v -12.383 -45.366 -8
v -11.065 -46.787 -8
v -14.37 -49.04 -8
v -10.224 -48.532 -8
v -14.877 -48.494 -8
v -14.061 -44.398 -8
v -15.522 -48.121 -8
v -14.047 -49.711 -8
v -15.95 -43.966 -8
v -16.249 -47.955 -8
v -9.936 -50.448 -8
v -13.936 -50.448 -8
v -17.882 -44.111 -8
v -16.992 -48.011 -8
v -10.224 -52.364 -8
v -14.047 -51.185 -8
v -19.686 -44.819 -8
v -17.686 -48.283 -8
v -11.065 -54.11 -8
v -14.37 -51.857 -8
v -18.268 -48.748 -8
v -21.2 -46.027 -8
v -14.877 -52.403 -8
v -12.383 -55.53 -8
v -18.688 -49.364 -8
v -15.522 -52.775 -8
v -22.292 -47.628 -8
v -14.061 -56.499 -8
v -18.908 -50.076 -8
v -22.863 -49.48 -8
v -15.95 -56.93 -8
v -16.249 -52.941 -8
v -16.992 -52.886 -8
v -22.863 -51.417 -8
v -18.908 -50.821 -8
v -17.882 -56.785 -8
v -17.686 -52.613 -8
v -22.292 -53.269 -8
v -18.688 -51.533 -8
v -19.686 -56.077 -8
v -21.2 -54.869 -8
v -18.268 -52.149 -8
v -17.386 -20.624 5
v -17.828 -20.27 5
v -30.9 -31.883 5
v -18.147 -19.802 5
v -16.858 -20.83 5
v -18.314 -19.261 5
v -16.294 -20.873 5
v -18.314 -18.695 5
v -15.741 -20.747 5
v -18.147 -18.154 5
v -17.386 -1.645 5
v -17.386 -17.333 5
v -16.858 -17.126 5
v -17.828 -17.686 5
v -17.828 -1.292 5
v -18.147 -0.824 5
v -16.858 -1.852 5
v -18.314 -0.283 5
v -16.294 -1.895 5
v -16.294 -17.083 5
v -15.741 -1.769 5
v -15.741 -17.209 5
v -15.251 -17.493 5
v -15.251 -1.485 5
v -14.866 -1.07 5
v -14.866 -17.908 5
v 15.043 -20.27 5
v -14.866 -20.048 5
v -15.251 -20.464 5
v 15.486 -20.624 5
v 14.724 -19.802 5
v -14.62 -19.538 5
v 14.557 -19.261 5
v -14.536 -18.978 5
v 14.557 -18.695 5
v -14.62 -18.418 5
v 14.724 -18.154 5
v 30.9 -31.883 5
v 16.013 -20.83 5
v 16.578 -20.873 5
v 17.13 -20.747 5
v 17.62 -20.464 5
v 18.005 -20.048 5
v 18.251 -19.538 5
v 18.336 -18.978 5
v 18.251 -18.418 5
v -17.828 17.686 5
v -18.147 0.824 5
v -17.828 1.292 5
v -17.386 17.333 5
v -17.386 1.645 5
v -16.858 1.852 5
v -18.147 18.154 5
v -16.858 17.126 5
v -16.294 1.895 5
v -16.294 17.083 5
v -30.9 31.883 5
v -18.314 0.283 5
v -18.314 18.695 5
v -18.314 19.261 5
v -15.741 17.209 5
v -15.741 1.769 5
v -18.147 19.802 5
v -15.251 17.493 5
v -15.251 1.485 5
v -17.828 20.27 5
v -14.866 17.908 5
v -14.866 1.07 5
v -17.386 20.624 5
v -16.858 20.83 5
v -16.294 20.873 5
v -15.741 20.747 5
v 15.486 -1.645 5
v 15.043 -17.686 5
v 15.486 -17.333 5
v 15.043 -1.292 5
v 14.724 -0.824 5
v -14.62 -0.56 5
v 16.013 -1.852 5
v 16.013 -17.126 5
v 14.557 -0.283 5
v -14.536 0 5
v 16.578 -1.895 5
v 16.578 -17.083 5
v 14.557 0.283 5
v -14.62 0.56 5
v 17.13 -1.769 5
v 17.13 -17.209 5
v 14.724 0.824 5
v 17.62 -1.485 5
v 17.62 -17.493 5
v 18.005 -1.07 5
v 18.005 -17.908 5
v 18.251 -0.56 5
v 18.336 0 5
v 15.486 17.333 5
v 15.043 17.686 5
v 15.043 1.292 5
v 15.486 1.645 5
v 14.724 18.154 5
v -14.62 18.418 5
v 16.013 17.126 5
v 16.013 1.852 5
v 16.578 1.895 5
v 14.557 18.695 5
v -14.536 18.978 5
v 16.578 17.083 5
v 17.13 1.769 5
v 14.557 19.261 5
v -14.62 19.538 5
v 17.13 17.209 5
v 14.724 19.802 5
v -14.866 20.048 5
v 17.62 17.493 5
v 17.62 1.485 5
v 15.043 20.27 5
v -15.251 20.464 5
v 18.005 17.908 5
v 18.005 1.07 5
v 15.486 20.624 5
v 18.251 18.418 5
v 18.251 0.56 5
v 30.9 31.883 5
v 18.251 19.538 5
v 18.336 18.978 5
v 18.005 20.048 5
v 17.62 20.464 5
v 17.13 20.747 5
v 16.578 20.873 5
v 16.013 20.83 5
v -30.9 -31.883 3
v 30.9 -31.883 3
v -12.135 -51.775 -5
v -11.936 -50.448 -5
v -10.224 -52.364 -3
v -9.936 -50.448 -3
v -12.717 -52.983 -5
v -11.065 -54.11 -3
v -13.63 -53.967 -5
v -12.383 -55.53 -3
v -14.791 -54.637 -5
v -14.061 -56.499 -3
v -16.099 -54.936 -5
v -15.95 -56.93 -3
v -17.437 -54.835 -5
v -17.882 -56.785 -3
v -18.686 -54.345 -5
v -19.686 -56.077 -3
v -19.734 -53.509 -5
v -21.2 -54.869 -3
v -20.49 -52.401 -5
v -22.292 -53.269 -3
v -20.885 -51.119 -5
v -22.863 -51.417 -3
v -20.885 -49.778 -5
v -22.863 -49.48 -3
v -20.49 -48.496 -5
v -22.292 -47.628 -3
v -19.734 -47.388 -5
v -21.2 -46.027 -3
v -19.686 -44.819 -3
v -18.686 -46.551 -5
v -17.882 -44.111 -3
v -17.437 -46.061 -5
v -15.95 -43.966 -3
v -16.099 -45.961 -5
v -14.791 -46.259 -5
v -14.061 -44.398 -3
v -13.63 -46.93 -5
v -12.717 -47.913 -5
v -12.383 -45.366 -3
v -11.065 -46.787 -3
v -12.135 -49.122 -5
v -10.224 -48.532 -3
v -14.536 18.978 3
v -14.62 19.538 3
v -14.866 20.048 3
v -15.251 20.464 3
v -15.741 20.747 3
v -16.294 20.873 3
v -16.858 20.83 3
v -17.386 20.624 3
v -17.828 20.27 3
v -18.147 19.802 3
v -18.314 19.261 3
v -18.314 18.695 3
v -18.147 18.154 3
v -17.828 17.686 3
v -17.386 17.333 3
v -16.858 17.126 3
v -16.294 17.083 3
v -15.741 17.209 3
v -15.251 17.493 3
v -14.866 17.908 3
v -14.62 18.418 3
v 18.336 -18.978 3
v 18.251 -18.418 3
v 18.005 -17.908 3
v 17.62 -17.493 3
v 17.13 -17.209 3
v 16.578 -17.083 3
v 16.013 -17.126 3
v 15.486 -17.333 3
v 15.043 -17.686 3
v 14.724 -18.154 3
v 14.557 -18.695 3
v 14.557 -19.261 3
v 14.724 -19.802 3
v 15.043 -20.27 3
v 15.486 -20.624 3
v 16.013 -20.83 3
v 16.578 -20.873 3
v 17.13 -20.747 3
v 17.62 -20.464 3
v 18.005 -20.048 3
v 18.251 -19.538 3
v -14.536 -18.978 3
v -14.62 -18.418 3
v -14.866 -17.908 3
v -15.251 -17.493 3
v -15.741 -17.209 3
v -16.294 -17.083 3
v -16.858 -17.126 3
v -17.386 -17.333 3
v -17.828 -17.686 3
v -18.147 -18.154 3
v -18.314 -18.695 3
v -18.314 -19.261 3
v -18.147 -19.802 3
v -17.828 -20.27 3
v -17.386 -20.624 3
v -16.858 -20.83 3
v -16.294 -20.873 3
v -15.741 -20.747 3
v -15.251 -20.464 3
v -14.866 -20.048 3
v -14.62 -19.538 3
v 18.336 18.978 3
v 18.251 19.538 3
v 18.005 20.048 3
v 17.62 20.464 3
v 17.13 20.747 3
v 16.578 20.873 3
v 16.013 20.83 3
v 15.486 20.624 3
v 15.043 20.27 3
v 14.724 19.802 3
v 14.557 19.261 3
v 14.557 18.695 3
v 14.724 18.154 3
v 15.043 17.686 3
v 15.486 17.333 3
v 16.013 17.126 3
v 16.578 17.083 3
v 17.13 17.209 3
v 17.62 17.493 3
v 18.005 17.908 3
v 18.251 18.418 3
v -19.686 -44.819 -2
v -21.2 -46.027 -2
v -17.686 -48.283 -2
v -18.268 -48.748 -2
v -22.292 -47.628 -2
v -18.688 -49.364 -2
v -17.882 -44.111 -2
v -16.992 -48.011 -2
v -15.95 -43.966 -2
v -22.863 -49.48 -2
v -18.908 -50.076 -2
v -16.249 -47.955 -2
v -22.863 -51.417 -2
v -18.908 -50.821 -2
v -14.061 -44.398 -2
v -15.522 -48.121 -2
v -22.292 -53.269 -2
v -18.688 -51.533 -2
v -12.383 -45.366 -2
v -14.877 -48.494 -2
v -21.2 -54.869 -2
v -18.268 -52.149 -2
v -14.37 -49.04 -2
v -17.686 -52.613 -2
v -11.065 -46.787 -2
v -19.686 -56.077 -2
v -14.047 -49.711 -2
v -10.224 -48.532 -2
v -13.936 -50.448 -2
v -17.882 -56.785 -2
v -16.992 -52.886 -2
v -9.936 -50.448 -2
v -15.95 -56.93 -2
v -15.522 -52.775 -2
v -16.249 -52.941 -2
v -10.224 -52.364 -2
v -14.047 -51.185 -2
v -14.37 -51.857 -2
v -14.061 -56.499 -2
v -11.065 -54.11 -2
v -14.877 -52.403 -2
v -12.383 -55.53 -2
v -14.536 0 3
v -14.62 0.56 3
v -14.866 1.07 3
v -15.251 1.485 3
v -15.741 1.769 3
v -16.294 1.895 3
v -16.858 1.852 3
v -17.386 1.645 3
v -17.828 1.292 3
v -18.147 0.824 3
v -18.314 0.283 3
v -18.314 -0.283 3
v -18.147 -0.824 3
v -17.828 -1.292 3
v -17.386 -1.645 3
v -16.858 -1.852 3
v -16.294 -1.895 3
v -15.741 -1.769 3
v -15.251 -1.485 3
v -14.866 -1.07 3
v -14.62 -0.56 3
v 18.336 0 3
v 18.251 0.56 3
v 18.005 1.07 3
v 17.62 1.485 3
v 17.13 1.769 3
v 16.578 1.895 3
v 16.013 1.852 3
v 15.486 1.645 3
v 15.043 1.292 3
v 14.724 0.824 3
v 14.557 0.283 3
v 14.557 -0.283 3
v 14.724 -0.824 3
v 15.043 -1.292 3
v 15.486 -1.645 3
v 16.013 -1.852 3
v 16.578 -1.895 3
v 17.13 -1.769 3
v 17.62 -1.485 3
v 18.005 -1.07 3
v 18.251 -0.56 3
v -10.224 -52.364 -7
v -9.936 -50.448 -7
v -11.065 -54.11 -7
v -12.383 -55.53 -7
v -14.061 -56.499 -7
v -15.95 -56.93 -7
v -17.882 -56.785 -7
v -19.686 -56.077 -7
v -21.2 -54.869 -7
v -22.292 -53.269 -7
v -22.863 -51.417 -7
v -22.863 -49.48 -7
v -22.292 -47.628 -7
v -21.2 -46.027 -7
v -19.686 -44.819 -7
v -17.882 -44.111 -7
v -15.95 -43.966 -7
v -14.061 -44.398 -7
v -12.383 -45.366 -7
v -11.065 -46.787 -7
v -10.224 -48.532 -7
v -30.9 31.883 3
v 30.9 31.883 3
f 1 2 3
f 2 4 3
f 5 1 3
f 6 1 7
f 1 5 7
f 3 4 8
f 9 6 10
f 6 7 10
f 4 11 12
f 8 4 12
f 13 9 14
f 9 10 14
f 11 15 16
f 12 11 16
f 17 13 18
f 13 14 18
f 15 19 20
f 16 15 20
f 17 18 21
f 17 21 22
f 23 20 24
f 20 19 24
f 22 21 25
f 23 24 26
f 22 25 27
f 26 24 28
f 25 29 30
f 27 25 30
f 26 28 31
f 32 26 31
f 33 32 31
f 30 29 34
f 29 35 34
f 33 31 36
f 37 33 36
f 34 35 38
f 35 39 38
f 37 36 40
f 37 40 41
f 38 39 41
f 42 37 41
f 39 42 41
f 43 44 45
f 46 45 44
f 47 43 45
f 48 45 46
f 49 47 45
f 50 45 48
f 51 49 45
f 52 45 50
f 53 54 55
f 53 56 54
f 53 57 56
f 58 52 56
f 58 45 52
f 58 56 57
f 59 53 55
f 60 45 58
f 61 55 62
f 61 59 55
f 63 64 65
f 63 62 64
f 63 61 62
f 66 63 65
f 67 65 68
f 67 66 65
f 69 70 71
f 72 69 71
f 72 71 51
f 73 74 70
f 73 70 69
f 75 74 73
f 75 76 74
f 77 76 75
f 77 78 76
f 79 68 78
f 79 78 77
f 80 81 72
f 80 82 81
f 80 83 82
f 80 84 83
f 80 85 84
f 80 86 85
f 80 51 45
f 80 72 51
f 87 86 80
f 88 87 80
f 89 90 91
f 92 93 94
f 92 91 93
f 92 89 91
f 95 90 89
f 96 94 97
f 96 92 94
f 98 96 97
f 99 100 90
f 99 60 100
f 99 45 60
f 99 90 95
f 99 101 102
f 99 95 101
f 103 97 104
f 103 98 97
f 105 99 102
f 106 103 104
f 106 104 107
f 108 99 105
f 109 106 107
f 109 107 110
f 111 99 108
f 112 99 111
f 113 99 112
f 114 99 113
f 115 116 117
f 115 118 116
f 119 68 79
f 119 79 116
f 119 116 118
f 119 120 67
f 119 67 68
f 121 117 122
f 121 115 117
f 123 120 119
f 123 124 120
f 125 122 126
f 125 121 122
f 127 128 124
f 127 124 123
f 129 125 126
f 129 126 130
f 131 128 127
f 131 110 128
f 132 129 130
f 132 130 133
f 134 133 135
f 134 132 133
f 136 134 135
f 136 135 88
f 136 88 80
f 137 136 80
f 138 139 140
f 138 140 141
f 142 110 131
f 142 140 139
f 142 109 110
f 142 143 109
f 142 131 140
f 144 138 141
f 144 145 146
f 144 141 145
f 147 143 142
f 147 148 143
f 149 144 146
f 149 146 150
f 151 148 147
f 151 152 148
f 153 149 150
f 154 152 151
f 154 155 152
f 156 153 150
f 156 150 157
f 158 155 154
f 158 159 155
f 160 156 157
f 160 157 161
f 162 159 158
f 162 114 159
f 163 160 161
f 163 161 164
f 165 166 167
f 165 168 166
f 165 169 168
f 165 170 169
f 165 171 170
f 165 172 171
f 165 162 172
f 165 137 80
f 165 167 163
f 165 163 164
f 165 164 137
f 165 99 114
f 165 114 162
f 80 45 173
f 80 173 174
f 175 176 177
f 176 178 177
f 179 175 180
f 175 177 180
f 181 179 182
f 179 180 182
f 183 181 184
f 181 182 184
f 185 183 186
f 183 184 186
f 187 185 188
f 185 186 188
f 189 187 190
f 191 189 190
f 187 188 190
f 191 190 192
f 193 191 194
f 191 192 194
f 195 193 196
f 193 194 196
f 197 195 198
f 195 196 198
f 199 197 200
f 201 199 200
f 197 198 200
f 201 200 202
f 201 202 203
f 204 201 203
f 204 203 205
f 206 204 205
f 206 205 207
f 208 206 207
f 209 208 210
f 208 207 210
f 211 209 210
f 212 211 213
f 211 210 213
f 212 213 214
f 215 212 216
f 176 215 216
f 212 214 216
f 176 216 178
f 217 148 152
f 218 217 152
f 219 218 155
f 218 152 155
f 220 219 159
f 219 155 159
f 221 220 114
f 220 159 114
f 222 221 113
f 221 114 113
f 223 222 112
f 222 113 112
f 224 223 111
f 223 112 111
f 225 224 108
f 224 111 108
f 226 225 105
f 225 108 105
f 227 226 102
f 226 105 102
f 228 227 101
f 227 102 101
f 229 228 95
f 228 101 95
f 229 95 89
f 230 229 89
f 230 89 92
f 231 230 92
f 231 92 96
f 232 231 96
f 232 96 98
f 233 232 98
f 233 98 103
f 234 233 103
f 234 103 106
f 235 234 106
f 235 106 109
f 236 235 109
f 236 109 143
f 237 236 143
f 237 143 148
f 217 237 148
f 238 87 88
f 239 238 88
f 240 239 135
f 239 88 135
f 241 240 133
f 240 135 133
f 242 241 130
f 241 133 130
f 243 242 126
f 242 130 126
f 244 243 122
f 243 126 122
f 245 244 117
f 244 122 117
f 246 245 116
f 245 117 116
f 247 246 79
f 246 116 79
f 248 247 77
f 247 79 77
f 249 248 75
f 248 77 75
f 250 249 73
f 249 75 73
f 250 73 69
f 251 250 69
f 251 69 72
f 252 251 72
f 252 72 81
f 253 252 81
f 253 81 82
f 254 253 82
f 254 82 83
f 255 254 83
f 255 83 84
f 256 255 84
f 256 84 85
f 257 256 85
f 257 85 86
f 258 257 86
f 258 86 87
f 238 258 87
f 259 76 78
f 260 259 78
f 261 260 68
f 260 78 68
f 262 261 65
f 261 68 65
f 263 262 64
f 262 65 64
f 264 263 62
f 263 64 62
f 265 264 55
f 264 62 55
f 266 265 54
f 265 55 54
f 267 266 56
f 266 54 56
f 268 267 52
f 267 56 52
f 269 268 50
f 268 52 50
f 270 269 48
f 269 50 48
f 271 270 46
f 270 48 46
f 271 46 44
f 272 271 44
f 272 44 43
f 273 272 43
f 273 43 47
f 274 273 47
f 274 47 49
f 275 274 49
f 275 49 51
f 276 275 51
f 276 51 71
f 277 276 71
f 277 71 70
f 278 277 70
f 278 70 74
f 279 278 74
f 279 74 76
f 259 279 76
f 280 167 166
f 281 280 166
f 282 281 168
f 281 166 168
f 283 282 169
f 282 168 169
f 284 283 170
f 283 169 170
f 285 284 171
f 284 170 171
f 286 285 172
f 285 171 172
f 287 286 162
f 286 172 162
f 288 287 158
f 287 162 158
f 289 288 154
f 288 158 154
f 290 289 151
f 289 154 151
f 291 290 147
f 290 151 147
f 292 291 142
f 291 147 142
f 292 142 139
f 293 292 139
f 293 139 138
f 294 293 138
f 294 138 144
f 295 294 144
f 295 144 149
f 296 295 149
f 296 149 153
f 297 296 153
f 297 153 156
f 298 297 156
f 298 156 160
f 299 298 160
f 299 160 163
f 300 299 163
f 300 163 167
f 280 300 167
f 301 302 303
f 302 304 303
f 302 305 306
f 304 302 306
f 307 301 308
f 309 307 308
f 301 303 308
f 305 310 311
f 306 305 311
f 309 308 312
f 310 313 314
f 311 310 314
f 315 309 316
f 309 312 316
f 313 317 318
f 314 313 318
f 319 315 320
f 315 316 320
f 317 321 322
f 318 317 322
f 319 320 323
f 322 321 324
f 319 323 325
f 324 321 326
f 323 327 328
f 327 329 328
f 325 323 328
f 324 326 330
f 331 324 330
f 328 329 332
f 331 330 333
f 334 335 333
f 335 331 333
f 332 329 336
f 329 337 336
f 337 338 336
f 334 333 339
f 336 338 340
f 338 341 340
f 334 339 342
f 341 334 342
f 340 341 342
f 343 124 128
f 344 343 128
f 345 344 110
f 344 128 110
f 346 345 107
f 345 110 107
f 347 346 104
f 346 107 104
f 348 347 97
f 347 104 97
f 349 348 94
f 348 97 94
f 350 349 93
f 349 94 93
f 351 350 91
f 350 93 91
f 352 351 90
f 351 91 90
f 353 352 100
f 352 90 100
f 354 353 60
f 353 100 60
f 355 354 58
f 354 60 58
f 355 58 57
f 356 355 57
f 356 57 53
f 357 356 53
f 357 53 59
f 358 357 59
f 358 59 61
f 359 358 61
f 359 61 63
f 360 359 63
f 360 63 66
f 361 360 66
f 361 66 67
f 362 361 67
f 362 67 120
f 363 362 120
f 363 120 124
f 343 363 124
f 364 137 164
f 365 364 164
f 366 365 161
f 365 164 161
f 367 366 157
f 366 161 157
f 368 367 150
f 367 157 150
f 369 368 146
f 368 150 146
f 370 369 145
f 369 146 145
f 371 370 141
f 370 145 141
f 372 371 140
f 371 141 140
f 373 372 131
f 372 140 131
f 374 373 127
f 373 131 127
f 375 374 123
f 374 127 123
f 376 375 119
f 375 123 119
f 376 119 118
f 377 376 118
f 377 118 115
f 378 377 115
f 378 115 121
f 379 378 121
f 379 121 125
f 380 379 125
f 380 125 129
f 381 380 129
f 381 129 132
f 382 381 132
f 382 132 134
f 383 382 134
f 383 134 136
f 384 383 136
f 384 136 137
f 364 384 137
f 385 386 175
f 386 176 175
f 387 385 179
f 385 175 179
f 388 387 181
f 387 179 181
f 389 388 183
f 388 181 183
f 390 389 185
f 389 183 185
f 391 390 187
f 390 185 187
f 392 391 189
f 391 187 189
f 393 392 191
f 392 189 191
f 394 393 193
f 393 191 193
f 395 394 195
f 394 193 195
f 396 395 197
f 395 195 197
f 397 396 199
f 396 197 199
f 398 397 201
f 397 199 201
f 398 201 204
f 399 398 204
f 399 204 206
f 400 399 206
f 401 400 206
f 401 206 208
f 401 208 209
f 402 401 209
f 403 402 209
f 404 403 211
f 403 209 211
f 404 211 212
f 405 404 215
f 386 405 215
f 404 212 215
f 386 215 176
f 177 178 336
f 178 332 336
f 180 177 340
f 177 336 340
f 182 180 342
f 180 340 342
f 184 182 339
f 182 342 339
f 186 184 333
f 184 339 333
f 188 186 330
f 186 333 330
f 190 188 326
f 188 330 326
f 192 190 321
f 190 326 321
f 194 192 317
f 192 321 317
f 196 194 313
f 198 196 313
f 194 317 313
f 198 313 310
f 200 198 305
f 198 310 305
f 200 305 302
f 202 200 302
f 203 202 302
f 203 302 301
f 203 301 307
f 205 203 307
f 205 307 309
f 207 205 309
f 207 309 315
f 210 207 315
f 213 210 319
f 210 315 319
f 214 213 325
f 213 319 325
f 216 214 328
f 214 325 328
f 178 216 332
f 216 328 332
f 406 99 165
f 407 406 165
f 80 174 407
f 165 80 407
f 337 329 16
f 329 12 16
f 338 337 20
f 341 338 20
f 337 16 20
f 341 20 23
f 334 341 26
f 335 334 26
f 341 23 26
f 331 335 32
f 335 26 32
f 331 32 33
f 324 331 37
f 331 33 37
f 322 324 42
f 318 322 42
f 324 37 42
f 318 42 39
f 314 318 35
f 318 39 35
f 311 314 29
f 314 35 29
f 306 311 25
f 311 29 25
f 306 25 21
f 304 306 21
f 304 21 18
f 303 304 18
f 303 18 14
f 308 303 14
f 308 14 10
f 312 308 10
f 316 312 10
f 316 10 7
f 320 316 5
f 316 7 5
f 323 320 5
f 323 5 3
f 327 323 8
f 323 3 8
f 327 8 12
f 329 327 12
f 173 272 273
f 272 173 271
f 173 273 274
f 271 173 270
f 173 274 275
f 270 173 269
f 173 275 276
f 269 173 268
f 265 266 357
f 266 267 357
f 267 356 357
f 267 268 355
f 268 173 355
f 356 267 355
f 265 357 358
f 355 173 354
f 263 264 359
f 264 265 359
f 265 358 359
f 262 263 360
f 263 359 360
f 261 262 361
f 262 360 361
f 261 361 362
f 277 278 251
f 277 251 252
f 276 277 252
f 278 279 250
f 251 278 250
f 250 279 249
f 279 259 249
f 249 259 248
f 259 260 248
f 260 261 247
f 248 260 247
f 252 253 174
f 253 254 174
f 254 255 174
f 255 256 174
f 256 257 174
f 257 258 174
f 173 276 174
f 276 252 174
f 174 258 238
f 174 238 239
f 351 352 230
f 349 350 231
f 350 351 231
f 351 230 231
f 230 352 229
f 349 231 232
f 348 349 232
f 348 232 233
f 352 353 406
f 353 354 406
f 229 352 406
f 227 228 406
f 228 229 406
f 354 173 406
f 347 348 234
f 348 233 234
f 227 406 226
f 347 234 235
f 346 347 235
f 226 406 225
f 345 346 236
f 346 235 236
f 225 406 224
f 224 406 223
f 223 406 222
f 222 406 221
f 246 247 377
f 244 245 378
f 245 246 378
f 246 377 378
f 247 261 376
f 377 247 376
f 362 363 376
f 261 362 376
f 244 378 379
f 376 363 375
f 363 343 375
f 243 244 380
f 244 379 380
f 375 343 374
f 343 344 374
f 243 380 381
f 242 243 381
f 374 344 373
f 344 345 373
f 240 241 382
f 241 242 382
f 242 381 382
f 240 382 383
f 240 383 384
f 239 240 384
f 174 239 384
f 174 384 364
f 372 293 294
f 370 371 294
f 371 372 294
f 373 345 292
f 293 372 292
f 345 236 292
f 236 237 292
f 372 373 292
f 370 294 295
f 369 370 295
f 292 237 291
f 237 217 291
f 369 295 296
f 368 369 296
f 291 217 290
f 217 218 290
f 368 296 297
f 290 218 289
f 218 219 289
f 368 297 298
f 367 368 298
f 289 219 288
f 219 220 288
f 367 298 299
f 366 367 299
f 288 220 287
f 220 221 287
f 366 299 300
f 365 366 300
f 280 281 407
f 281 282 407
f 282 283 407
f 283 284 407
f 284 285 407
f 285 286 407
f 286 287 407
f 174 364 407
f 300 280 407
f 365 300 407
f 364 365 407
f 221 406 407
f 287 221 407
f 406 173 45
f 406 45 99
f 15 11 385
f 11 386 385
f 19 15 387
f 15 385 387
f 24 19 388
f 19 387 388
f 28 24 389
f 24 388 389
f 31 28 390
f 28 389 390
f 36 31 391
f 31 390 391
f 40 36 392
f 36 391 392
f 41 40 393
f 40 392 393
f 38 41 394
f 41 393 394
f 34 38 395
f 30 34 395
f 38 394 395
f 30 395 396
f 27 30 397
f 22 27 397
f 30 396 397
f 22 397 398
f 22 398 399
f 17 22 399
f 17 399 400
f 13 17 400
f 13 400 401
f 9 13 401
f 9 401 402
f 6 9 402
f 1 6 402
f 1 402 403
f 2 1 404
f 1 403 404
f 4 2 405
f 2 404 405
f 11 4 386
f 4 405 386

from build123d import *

# Parameters (mm, degrees)
F0_W     = 61.8
F0_H     = 100.8965958967
F1_DEPTH = 5
F4_R     = 1.9
F4_W     = 61.8
F4_H     = 18.5648719378
F5_DEPTH = 25
F7_DEPTH = 3


with BuildPart() as f1:
    # F0 (on Top) → F1 (new body)
    with BuildSketch(Plane.XY):
        Rectangle(F0_W, F0_H)
    extrude(amount=F1_DEPTH)

    # F4 (on face) → F5 (cut)
    with BuildSketch(Plane.XY.offset(5)):
        with Locations((-16.4355339059, 0)):
            Circle(F4_R)
        with Locations((-16.4355339059, -18.9781198497)):
            Circle(F4_R)
        with Locations((16.4355339059, 18.9781198497)):
            Circle(F4_R)
        with Locations((16.4355339059, 0)):
            Circle(F4_R)
        with Locations((16.4355339059, -18.9781198497)):
            Circle(F4_R)
        with Locations((-16.4355339059, 18.9781198497)):
            Circle(F4_R)
        with Locations((0, 41.1658619795)):
            Rectangle(F4_W, F4_H)
        with Locations((0, -41.1658619795)):
            Rectangle(F4_W, F4_H)
    extrude(amount=-F5_DEPTH, mode=Mode.SUBTRACT)

    # F7 (cut): a face of the model
    f7_faces = [f1.faces().sort_by_distance(p)[0] for p in [
        (0, 0, 0),
    ]]
    extrude(f7_faces, amount=-F7_DEPTH, mode=Mode.SUBTRACT)


with BuildPart() as f3:
    # F2 (on face) → F3 (revolve)
    with BuildSketch(Plane.XZ.offset(50.4482979484)):
        Polygon((-9.9355339059, -2), (-13.9355339059, -2), (-13.9355339059, -8), (-9.9355339059, -8), (-9.9355339059, -7), (-11.9355339059, -5), (-9.9355339059, -3), align=None)
    revolve(axis=Axis((-16.4355339059, -50.4482979484, -5), (0, 0, -1)))


solid = Compound([f1.part, f3.part])
